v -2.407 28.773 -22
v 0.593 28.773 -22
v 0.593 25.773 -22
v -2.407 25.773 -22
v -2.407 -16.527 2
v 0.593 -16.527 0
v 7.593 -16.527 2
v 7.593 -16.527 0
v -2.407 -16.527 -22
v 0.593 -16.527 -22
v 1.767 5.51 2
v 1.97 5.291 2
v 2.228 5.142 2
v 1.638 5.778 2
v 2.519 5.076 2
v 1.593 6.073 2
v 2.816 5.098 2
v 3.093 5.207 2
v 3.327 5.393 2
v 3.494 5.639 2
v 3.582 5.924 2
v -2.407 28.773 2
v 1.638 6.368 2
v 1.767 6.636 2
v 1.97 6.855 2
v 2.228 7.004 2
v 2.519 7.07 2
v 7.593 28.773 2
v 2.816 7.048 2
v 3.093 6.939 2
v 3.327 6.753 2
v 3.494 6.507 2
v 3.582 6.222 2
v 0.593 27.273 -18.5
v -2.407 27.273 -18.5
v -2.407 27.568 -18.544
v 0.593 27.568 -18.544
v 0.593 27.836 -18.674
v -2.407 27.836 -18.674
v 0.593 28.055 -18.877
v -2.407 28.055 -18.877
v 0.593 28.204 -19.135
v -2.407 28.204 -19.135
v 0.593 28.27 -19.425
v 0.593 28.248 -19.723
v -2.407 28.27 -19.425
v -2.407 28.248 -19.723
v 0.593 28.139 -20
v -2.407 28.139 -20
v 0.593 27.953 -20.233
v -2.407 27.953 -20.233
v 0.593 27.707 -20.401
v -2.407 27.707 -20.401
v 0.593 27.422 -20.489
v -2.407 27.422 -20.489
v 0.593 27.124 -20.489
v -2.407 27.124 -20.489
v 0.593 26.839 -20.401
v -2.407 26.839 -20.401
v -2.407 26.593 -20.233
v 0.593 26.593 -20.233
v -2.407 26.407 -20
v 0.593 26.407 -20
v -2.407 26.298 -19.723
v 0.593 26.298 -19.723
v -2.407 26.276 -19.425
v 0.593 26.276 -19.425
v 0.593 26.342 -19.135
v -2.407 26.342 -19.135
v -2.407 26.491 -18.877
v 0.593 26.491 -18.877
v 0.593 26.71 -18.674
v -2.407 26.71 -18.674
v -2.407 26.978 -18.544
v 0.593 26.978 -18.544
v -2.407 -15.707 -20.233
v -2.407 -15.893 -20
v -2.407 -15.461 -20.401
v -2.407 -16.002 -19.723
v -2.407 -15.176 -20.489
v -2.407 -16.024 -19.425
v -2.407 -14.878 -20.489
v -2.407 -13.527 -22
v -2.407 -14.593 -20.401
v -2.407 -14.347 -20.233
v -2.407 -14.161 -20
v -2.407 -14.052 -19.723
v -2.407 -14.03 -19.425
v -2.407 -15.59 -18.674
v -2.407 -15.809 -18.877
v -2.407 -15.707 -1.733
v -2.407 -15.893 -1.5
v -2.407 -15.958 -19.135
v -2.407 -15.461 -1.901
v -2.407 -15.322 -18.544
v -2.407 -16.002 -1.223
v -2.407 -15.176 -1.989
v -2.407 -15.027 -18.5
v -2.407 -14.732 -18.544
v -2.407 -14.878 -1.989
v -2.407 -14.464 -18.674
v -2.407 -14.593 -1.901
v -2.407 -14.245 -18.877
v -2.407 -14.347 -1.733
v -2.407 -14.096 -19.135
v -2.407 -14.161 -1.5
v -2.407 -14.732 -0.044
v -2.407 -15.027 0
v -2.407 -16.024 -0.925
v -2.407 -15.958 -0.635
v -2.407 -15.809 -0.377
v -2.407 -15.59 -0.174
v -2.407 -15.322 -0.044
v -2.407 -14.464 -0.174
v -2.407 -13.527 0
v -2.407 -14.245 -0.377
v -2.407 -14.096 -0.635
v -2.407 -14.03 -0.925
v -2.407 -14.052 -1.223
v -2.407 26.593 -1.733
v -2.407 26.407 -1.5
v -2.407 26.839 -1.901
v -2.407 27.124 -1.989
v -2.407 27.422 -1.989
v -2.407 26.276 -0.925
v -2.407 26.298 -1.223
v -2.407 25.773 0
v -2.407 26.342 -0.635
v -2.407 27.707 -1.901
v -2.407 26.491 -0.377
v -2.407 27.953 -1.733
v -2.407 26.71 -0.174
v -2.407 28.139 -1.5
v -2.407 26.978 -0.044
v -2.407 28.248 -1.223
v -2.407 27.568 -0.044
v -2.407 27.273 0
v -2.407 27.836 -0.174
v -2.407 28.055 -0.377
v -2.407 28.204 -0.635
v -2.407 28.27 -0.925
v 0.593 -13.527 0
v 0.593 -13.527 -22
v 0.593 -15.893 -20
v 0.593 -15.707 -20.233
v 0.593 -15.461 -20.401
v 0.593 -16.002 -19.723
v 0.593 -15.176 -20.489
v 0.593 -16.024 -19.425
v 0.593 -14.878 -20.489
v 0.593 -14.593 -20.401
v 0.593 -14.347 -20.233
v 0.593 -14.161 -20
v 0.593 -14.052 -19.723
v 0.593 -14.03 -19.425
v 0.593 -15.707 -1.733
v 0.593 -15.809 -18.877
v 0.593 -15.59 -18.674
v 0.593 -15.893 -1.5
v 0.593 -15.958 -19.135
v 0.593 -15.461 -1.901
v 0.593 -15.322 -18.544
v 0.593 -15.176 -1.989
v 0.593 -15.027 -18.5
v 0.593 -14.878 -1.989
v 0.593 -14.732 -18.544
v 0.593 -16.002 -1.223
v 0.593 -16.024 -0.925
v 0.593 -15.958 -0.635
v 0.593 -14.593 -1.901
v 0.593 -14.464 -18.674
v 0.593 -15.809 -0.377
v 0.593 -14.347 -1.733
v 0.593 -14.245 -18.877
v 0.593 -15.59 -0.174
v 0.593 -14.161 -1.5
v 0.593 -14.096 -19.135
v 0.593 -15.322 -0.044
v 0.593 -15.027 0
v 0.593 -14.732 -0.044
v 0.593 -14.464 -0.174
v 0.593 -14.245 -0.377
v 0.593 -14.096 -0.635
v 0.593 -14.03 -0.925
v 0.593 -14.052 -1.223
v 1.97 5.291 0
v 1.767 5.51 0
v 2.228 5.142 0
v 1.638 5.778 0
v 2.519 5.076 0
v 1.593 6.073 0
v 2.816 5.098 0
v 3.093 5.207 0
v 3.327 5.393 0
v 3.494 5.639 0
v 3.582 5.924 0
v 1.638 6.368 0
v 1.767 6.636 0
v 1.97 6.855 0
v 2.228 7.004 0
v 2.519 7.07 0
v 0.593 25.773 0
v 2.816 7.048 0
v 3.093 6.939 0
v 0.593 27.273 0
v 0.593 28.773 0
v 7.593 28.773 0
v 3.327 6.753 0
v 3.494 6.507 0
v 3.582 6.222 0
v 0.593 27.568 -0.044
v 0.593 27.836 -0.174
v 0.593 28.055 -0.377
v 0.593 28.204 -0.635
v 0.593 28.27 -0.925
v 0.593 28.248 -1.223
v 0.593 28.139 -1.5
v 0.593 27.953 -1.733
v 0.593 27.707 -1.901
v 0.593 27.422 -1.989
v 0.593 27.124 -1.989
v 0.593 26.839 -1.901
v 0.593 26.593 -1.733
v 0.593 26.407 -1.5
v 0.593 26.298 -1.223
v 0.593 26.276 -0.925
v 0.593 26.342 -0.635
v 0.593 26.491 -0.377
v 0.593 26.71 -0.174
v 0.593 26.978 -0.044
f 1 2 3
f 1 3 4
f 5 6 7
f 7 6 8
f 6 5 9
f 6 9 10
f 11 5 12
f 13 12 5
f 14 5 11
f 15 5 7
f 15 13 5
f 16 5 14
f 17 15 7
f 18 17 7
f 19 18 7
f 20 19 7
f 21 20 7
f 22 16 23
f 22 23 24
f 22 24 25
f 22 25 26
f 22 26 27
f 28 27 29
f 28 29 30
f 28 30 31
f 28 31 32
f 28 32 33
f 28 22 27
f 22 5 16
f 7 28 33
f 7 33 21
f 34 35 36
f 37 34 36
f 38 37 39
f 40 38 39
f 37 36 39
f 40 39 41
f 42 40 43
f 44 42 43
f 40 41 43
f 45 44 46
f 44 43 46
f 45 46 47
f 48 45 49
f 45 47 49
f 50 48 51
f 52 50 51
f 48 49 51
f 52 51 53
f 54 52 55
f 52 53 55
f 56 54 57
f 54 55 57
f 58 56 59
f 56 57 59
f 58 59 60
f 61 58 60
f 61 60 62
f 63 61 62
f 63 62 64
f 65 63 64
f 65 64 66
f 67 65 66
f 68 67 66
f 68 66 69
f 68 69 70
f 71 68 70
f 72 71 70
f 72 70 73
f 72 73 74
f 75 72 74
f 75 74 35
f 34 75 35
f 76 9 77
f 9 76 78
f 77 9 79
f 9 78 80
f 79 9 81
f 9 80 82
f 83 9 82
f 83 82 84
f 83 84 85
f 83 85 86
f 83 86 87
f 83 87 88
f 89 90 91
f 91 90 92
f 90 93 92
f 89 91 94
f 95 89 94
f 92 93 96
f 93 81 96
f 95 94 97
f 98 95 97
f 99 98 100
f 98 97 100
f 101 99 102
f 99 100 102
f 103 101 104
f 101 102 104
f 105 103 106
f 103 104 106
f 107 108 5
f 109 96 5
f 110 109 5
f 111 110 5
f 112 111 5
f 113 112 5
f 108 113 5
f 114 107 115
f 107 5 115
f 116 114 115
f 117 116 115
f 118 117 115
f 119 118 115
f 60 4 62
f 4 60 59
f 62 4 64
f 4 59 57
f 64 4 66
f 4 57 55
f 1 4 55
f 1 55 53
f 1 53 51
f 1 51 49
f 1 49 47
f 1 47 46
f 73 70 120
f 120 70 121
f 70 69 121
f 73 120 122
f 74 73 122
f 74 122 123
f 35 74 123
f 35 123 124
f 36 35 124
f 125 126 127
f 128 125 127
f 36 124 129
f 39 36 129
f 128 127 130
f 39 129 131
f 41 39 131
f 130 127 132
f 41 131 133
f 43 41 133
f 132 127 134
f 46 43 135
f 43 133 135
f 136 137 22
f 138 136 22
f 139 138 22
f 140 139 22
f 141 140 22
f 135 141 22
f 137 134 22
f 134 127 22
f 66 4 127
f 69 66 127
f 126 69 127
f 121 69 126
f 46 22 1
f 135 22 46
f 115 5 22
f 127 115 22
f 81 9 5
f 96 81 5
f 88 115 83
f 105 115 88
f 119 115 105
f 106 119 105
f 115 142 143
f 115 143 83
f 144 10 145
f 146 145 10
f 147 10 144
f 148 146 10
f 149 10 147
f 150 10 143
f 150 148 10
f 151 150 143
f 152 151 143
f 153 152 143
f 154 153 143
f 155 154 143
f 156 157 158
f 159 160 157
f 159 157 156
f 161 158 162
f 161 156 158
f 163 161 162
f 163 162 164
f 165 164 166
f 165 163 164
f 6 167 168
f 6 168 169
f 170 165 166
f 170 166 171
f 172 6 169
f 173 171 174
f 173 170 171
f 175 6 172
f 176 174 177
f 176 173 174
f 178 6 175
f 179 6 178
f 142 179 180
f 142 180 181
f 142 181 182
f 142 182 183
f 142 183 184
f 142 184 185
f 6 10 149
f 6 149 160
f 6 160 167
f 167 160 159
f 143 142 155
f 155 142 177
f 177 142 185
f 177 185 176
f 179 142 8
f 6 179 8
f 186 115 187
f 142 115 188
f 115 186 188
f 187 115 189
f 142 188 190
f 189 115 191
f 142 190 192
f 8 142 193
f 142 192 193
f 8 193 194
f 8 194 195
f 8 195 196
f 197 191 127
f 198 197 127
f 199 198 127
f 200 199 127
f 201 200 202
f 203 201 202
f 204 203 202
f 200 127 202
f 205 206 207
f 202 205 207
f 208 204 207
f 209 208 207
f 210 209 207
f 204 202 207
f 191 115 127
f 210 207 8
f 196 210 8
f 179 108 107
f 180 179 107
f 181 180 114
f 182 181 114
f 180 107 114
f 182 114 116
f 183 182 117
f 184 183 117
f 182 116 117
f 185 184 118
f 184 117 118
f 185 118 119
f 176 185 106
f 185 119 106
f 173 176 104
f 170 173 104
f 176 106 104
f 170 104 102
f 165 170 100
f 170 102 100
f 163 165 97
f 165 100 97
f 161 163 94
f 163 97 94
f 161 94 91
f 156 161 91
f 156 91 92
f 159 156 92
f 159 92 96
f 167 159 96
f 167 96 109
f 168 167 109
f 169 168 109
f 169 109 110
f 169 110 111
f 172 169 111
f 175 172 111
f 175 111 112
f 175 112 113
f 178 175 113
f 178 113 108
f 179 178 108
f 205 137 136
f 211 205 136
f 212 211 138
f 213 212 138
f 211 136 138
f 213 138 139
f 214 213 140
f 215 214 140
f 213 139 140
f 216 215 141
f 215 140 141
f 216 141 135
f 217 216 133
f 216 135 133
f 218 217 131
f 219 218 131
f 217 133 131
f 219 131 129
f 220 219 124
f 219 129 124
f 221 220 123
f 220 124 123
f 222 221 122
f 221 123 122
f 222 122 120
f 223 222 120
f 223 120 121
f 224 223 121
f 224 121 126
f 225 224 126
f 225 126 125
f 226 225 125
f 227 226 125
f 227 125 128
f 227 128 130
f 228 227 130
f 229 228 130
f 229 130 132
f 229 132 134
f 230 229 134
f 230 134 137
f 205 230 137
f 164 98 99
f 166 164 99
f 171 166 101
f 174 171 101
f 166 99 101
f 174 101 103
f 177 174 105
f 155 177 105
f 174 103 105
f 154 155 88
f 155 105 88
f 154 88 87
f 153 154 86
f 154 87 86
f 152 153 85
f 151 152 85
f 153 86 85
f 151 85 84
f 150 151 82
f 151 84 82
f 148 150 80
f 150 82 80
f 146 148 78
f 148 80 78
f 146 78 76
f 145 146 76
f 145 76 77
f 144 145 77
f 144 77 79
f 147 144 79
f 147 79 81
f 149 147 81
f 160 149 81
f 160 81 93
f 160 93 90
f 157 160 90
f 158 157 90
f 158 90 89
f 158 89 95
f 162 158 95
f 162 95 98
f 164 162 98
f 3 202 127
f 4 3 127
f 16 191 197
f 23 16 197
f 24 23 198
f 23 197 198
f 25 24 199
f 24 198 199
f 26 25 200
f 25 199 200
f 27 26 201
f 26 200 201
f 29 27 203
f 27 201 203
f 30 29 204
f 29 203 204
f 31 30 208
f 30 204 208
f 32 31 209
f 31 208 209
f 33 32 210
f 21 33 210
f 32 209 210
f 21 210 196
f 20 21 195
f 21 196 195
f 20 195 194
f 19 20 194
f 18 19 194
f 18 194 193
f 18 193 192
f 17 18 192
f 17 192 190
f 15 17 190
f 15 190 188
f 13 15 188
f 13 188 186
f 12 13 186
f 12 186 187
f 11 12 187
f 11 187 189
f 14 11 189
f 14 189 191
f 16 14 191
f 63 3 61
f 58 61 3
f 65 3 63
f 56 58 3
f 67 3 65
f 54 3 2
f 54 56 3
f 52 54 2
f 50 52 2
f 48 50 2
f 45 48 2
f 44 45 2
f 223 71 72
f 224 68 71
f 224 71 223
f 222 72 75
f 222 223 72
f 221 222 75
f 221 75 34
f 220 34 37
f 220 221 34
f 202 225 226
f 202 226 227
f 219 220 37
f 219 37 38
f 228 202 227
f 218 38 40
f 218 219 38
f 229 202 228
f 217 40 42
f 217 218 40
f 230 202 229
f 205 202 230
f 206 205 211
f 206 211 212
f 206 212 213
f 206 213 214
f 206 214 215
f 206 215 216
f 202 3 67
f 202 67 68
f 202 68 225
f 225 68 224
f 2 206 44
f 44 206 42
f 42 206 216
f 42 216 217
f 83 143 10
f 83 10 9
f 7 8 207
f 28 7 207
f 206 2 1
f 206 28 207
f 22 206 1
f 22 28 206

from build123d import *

# Parameters (mm, degrees)
SKETCH1_W           = 10
SKETCH1_H           = 45.3
BOSS_EXTRUDE2_DEPTH = 2
SKETCH2_W           = 3
SKETCH2_H           = 3
BOSS_EXTRUDE3_DEPTH = 22
SKETCH3_R           = 1
CUT_EXTRUDE1_DEPTH  = 22
SKETCH4_R           = 1
CUT_EXTRUDE2_DEPTH  = 22


with BuildPart() as part:
    # Sketch1 → Boss-Extrude2 (new body)
    with BuildSketch(Plane.XY):
        with Locations((2.593477414, 6.123019747)):
            Rectangle(SKETCH1_W, SKETCH1_H)
    extrude(amount=BOSS_EXTRUDE2_DEPTH)

    # Sketch2 → Boss-Extrude3 (add)
    with BuildSketch(Plane(origin=(0, 0, 0), x_dir=(-1, 0, 0), z_dir=(0, 0, -1))):
        with Locations((0.906522586, 27.273019747)):
            Rectangle(SKETCH2_W, SKETCH2_H)
        with Locations((0.906522586, -15.026980253)):
            Rectangle(SKETCH2_W, SKETCH2_H)
    extrude(amount=BOSS_EXTRUDE3_DEPTH)

    # Sketch3 → Cut-Extrude1 (cut)
    with BuildSketch(Plane.ZY.offset(2.406522586)):
        with Locations((-19.5, 27.273019747)):
            Circle(SKETCH3_R)
        with Locations((-1, 27.273019747)):
            Circle(SKETCH3_R)
        with Locations((-1, -15.026980253)):
            Circle(SKETCH3_R)
        with Locations((-19.5, -15.026980253)):
            Circle(SKETCH3_R)
    extrude(amount=-CUT_EXTRUDE1_DEPTH, mode=Mode.SUBTRACT)

    # Sketch4 → Cut-Extrude2 (cut)
    with BuildSketch(Plane(origin=(0, 0, 0), x_dir=(-1, 0, 0), z_dir=(0, 0, -1))):
        with Locations((-2.593477414, 6.073019747)):
            Circle(SKETCH4_R)
    extrude(amount=-CUT_EXTRUDE2_DEPTH, mode=Mode.SUBTRACT)


solid = part.part
